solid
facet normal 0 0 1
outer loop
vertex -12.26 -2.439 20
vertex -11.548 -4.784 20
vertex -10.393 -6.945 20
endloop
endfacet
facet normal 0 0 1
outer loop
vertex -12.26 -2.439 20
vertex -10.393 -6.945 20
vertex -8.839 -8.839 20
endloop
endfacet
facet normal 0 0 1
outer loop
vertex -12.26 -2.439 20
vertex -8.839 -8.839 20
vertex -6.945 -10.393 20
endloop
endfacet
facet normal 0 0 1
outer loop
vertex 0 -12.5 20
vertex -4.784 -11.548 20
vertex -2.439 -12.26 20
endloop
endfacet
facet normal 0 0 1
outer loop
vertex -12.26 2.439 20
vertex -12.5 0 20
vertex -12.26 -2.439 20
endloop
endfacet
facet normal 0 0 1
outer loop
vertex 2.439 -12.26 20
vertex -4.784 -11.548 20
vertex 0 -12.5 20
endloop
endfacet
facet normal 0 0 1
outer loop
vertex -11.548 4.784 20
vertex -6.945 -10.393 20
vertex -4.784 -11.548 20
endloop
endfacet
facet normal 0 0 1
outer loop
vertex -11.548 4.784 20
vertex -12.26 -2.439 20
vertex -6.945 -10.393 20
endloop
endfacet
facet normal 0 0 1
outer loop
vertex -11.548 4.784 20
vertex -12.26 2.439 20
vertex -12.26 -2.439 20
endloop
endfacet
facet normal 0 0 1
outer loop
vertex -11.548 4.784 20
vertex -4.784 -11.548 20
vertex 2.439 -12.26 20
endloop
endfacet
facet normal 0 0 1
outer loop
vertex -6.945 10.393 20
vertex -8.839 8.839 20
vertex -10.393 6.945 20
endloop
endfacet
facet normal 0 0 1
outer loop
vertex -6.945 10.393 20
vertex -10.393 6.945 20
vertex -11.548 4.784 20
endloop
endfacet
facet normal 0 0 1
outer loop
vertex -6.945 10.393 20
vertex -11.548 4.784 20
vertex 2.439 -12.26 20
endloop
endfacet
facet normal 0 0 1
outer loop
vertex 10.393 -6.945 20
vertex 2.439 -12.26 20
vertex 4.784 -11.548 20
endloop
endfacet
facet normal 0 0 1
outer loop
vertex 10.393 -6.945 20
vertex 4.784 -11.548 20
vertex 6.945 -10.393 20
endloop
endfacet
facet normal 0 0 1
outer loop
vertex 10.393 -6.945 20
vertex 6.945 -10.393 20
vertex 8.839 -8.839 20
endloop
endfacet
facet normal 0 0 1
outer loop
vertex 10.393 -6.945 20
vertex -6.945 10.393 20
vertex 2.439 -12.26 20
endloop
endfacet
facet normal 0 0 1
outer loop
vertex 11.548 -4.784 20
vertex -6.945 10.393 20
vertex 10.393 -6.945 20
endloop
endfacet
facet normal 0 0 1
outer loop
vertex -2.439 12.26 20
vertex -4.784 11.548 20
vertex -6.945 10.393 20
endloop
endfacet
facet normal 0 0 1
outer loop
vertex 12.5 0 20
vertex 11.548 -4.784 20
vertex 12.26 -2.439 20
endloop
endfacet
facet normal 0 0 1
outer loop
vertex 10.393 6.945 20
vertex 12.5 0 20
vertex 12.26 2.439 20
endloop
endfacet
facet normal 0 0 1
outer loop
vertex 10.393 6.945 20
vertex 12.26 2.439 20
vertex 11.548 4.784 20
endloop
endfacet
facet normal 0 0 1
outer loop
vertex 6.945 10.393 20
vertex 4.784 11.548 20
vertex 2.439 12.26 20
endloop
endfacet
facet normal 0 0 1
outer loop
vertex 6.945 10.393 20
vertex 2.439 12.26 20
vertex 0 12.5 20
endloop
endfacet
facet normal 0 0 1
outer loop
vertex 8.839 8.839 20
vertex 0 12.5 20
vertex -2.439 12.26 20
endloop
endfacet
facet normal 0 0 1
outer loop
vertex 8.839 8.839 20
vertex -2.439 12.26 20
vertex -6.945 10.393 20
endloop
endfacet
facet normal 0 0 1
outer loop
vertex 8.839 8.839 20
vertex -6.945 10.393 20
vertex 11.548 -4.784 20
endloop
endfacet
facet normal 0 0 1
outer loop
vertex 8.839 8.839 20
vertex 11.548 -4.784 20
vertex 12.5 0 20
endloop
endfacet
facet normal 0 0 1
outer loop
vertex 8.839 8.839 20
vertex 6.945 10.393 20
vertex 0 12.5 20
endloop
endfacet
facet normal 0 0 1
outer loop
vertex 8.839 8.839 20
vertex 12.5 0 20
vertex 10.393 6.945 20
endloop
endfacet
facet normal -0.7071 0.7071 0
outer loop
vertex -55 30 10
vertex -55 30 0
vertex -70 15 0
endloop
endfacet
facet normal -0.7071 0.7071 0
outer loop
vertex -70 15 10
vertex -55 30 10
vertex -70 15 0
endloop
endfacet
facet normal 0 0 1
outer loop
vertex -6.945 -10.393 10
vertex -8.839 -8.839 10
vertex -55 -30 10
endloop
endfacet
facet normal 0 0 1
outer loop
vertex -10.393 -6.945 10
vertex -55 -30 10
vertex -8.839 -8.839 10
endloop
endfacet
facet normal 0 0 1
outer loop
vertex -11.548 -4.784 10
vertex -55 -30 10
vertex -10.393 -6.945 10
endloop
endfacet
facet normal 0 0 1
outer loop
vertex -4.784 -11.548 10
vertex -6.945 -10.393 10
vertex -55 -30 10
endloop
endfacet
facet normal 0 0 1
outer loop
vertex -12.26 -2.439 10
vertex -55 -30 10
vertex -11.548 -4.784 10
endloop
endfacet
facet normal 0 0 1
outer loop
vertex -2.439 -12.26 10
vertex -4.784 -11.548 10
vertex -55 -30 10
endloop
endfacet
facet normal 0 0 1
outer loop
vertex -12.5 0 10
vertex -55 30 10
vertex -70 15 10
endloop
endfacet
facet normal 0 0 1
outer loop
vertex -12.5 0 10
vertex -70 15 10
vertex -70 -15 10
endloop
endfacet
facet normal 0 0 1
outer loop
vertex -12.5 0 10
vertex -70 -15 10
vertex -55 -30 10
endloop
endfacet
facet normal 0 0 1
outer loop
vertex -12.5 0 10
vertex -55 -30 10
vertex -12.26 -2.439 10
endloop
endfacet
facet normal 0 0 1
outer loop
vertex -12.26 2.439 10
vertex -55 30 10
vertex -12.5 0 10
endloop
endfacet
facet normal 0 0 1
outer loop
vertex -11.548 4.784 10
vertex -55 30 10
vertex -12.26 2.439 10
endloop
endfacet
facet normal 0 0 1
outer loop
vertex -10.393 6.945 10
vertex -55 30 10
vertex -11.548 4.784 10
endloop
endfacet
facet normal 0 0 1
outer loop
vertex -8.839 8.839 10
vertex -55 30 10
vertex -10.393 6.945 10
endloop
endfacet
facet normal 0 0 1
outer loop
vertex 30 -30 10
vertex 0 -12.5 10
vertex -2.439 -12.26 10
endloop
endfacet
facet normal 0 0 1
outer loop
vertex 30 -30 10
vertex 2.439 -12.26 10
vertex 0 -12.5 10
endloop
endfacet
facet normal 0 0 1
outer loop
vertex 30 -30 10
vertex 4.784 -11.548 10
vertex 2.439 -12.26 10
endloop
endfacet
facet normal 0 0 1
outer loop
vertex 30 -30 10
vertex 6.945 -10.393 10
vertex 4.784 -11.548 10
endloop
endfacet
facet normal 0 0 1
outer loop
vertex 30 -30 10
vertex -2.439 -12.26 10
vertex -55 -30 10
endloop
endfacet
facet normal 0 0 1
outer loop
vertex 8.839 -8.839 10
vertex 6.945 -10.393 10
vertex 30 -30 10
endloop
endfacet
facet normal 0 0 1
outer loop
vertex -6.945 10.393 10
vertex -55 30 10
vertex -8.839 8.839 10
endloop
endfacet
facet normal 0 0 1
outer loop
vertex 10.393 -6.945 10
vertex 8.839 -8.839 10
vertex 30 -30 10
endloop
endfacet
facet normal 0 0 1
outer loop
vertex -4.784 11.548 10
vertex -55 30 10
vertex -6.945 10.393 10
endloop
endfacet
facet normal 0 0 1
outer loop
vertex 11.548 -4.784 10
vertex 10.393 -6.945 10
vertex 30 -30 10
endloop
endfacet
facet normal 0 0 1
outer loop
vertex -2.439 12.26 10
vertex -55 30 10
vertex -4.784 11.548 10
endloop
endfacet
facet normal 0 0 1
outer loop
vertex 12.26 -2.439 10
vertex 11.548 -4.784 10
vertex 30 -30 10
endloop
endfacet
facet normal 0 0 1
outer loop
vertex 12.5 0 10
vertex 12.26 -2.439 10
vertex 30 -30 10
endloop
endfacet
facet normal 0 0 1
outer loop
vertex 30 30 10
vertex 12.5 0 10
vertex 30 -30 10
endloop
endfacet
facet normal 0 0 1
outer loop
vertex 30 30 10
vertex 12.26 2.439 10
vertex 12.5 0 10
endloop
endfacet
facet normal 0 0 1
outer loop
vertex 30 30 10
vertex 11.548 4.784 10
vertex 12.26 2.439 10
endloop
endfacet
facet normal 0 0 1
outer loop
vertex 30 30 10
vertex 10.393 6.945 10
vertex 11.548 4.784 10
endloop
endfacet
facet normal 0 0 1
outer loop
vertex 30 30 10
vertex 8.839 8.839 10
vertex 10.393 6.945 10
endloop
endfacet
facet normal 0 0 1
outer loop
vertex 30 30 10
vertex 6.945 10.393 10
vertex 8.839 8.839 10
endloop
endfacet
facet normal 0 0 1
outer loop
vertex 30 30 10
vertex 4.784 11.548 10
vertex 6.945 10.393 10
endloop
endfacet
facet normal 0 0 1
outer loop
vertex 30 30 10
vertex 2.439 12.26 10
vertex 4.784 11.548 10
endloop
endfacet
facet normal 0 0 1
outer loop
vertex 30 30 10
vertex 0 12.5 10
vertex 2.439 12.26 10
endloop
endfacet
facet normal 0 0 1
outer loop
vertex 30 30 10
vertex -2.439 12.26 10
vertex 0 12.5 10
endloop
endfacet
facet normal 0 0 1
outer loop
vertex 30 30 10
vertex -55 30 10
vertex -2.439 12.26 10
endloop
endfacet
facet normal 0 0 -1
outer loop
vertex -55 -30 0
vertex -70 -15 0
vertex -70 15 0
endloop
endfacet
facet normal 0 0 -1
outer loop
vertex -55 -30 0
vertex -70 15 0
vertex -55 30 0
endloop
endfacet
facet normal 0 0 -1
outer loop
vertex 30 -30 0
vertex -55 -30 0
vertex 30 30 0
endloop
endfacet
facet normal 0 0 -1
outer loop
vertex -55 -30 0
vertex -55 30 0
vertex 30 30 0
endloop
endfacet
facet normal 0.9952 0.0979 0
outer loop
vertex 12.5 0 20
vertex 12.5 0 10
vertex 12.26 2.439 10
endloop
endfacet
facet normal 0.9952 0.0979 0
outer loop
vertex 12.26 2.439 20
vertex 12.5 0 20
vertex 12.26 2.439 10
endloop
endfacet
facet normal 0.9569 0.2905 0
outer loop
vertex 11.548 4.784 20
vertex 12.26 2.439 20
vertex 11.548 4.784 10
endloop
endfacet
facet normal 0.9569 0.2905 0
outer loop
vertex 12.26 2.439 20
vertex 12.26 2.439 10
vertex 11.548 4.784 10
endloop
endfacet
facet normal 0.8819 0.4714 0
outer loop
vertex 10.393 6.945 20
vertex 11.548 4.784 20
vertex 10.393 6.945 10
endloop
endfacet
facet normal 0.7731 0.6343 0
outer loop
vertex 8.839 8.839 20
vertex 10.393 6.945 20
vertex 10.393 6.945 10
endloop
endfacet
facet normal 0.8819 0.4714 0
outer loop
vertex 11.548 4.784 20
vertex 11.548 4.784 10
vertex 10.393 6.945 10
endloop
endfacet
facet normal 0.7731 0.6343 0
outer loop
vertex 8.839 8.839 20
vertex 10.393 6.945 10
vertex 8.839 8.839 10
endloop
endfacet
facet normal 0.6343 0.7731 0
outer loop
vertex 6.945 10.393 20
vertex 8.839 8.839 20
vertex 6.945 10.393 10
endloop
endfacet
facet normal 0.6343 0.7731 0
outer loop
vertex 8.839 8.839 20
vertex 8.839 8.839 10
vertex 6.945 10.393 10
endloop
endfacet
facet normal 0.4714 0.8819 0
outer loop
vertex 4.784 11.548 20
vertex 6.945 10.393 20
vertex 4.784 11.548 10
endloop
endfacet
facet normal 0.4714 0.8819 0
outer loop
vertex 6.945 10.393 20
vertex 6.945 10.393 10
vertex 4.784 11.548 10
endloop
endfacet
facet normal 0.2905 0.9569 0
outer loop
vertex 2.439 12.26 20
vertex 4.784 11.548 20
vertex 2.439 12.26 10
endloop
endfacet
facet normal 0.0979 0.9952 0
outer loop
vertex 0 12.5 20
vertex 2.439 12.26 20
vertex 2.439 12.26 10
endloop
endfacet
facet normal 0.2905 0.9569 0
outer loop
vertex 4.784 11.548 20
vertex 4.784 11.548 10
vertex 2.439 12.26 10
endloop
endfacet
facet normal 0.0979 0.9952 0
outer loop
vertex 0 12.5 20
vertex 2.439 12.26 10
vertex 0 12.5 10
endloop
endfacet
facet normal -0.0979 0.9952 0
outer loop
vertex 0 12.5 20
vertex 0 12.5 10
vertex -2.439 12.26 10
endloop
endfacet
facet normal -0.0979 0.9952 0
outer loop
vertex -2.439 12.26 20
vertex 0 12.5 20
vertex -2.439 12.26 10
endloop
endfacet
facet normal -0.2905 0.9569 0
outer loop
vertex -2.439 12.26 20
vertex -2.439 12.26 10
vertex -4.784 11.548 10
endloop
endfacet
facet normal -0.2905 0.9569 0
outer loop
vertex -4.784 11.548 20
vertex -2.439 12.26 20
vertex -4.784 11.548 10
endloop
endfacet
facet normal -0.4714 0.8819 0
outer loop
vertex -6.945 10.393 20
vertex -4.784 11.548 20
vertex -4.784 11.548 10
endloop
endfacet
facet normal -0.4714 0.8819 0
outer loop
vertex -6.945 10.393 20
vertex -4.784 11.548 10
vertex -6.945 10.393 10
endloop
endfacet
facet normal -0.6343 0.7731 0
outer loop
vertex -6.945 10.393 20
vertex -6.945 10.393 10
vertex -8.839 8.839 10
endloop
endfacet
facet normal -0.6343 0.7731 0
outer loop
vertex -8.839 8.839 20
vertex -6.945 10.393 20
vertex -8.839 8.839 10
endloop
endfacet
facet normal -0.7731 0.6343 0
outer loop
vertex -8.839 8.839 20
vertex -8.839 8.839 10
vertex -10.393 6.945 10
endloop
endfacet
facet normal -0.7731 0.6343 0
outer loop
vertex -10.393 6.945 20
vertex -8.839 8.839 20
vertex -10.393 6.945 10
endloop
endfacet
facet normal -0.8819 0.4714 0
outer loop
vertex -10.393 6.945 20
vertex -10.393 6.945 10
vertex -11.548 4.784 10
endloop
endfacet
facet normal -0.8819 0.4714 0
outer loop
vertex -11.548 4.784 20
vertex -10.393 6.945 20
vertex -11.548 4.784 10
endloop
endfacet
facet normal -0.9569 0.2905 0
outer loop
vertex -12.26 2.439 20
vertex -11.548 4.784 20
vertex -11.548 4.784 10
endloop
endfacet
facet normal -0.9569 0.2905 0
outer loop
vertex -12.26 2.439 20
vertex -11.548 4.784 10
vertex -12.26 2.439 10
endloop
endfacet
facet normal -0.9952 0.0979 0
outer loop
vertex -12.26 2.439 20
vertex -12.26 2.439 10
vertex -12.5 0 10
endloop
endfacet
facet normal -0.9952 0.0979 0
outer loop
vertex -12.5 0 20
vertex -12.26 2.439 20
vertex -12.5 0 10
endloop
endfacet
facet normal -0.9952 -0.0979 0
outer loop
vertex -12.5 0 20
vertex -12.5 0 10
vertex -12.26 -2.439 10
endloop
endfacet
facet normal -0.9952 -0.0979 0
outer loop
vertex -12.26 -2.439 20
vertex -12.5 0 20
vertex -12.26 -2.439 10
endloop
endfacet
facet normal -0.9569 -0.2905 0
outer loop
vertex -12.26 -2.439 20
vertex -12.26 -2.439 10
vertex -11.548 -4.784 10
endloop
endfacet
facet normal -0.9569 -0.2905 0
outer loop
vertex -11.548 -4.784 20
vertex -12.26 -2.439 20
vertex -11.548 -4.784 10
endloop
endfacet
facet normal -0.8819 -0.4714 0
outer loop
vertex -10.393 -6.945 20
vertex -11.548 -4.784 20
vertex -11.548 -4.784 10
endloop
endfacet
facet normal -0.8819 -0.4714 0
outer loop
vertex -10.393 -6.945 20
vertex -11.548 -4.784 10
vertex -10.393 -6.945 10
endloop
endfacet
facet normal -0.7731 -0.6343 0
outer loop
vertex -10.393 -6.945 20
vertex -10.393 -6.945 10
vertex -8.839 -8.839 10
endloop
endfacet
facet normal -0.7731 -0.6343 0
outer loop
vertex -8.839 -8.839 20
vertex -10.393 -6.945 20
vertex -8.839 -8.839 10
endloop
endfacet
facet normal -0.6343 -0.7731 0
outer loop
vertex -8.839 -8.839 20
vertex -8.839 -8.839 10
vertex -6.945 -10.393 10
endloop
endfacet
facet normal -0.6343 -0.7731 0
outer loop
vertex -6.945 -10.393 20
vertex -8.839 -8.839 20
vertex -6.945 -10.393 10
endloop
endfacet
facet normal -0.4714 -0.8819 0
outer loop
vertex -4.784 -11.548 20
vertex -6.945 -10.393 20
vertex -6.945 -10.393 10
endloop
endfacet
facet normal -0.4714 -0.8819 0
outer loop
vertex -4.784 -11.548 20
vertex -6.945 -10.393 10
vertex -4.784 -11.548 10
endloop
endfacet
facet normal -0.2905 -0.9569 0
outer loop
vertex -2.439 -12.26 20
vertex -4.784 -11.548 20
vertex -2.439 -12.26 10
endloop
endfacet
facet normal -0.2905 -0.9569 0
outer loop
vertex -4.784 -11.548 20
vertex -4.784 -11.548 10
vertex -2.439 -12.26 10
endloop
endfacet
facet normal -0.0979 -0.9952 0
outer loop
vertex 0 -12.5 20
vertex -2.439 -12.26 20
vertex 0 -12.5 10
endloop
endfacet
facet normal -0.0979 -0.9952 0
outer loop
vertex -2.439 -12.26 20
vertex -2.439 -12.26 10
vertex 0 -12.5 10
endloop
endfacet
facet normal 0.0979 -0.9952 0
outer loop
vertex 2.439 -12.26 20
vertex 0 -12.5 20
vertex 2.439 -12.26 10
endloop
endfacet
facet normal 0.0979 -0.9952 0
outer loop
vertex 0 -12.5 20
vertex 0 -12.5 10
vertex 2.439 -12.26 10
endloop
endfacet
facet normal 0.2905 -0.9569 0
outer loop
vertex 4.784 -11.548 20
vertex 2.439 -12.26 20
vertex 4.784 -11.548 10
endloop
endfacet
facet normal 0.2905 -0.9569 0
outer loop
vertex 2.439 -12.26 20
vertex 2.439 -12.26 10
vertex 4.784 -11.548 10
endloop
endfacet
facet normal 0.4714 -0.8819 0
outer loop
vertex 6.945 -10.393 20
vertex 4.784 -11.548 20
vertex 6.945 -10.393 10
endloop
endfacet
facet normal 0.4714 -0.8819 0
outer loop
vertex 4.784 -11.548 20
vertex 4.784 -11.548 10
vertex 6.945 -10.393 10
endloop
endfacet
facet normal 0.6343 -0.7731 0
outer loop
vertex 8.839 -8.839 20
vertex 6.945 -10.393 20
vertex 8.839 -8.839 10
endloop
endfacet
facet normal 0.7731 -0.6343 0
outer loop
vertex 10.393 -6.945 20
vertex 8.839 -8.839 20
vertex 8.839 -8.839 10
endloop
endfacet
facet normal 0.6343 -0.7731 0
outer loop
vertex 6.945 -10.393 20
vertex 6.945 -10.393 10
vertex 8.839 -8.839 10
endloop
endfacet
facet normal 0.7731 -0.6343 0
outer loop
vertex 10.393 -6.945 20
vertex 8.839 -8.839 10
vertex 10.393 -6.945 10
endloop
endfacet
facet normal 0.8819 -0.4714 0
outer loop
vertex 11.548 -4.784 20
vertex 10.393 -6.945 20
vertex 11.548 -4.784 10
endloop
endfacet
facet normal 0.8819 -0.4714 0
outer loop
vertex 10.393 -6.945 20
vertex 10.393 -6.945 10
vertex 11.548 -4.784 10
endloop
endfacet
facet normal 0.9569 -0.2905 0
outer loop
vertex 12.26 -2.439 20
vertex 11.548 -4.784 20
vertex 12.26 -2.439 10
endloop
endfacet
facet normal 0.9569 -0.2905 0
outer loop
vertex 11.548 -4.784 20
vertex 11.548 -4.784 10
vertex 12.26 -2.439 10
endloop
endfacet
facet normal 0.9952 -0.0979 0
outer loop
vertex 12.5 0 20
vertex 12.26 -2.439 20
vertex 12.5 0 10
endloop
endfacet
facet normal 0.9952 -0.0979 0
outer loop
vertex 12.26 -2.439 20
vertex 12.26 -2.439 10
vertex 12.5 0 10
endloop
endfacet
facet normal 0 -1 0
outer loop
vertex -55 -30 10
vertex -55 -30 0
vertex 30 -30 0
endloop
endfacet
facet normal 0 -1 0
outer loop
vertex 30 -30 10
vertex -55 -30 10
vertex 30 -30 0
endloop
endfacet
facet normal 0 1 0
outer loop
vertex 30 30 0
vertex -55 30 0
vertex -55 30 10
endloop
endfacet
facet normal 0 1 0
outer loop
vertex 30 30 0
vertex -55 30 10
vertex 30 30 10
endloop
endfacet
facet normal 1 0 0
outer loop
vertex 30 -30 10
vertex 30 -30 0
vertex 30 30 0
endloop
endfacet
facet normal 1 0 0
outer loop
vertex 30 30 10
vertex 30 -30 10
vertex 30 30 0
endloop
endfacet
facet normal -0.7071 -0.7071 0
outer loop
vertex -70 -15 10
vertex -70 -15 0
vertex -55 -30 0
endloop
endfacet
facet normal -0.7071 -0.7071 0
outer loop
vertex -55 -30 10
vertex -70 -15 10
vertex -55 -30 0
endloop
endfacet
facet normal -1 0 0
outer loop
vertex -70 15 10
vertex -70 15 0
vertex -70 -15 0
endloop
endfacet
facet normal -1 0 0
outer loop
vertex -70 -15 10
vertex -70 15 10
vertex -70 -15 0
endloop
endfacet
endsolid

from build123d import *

# Parameters (mm, degrees)
BASE_SKETCH_R       = 12.5
BOSS_EXTRUDE1_DEPTH = 10
BASE_SKETCH_3_R     = 12.5
BOSS_EXTRUDE2_DEPTH = 20


with BuildPart() as part:
    # Base Sketch → Boss-Extrude1 (new body)
    with BuildSketch(Plane.XY):
        Polygon((-55, -30), (30, -30), (30, 30), (-55, 30), (-70, 15), (-70, -15), align=None)
        Circle(BASE_SKETCH_R, mode=Mode.SUBTRACT)
    extrude(amount=BOSS_EXTRUDE1_DEPTH)

    # Base Sketch<3> → Boss-Extrude2 (add)
    with BuildSketch(Plane.XY):
        Circle(BASE_SKETCH_3_R)
    extrude(amount=BOSS_EXTRUDE2_DEPTH)


solid = part.part
